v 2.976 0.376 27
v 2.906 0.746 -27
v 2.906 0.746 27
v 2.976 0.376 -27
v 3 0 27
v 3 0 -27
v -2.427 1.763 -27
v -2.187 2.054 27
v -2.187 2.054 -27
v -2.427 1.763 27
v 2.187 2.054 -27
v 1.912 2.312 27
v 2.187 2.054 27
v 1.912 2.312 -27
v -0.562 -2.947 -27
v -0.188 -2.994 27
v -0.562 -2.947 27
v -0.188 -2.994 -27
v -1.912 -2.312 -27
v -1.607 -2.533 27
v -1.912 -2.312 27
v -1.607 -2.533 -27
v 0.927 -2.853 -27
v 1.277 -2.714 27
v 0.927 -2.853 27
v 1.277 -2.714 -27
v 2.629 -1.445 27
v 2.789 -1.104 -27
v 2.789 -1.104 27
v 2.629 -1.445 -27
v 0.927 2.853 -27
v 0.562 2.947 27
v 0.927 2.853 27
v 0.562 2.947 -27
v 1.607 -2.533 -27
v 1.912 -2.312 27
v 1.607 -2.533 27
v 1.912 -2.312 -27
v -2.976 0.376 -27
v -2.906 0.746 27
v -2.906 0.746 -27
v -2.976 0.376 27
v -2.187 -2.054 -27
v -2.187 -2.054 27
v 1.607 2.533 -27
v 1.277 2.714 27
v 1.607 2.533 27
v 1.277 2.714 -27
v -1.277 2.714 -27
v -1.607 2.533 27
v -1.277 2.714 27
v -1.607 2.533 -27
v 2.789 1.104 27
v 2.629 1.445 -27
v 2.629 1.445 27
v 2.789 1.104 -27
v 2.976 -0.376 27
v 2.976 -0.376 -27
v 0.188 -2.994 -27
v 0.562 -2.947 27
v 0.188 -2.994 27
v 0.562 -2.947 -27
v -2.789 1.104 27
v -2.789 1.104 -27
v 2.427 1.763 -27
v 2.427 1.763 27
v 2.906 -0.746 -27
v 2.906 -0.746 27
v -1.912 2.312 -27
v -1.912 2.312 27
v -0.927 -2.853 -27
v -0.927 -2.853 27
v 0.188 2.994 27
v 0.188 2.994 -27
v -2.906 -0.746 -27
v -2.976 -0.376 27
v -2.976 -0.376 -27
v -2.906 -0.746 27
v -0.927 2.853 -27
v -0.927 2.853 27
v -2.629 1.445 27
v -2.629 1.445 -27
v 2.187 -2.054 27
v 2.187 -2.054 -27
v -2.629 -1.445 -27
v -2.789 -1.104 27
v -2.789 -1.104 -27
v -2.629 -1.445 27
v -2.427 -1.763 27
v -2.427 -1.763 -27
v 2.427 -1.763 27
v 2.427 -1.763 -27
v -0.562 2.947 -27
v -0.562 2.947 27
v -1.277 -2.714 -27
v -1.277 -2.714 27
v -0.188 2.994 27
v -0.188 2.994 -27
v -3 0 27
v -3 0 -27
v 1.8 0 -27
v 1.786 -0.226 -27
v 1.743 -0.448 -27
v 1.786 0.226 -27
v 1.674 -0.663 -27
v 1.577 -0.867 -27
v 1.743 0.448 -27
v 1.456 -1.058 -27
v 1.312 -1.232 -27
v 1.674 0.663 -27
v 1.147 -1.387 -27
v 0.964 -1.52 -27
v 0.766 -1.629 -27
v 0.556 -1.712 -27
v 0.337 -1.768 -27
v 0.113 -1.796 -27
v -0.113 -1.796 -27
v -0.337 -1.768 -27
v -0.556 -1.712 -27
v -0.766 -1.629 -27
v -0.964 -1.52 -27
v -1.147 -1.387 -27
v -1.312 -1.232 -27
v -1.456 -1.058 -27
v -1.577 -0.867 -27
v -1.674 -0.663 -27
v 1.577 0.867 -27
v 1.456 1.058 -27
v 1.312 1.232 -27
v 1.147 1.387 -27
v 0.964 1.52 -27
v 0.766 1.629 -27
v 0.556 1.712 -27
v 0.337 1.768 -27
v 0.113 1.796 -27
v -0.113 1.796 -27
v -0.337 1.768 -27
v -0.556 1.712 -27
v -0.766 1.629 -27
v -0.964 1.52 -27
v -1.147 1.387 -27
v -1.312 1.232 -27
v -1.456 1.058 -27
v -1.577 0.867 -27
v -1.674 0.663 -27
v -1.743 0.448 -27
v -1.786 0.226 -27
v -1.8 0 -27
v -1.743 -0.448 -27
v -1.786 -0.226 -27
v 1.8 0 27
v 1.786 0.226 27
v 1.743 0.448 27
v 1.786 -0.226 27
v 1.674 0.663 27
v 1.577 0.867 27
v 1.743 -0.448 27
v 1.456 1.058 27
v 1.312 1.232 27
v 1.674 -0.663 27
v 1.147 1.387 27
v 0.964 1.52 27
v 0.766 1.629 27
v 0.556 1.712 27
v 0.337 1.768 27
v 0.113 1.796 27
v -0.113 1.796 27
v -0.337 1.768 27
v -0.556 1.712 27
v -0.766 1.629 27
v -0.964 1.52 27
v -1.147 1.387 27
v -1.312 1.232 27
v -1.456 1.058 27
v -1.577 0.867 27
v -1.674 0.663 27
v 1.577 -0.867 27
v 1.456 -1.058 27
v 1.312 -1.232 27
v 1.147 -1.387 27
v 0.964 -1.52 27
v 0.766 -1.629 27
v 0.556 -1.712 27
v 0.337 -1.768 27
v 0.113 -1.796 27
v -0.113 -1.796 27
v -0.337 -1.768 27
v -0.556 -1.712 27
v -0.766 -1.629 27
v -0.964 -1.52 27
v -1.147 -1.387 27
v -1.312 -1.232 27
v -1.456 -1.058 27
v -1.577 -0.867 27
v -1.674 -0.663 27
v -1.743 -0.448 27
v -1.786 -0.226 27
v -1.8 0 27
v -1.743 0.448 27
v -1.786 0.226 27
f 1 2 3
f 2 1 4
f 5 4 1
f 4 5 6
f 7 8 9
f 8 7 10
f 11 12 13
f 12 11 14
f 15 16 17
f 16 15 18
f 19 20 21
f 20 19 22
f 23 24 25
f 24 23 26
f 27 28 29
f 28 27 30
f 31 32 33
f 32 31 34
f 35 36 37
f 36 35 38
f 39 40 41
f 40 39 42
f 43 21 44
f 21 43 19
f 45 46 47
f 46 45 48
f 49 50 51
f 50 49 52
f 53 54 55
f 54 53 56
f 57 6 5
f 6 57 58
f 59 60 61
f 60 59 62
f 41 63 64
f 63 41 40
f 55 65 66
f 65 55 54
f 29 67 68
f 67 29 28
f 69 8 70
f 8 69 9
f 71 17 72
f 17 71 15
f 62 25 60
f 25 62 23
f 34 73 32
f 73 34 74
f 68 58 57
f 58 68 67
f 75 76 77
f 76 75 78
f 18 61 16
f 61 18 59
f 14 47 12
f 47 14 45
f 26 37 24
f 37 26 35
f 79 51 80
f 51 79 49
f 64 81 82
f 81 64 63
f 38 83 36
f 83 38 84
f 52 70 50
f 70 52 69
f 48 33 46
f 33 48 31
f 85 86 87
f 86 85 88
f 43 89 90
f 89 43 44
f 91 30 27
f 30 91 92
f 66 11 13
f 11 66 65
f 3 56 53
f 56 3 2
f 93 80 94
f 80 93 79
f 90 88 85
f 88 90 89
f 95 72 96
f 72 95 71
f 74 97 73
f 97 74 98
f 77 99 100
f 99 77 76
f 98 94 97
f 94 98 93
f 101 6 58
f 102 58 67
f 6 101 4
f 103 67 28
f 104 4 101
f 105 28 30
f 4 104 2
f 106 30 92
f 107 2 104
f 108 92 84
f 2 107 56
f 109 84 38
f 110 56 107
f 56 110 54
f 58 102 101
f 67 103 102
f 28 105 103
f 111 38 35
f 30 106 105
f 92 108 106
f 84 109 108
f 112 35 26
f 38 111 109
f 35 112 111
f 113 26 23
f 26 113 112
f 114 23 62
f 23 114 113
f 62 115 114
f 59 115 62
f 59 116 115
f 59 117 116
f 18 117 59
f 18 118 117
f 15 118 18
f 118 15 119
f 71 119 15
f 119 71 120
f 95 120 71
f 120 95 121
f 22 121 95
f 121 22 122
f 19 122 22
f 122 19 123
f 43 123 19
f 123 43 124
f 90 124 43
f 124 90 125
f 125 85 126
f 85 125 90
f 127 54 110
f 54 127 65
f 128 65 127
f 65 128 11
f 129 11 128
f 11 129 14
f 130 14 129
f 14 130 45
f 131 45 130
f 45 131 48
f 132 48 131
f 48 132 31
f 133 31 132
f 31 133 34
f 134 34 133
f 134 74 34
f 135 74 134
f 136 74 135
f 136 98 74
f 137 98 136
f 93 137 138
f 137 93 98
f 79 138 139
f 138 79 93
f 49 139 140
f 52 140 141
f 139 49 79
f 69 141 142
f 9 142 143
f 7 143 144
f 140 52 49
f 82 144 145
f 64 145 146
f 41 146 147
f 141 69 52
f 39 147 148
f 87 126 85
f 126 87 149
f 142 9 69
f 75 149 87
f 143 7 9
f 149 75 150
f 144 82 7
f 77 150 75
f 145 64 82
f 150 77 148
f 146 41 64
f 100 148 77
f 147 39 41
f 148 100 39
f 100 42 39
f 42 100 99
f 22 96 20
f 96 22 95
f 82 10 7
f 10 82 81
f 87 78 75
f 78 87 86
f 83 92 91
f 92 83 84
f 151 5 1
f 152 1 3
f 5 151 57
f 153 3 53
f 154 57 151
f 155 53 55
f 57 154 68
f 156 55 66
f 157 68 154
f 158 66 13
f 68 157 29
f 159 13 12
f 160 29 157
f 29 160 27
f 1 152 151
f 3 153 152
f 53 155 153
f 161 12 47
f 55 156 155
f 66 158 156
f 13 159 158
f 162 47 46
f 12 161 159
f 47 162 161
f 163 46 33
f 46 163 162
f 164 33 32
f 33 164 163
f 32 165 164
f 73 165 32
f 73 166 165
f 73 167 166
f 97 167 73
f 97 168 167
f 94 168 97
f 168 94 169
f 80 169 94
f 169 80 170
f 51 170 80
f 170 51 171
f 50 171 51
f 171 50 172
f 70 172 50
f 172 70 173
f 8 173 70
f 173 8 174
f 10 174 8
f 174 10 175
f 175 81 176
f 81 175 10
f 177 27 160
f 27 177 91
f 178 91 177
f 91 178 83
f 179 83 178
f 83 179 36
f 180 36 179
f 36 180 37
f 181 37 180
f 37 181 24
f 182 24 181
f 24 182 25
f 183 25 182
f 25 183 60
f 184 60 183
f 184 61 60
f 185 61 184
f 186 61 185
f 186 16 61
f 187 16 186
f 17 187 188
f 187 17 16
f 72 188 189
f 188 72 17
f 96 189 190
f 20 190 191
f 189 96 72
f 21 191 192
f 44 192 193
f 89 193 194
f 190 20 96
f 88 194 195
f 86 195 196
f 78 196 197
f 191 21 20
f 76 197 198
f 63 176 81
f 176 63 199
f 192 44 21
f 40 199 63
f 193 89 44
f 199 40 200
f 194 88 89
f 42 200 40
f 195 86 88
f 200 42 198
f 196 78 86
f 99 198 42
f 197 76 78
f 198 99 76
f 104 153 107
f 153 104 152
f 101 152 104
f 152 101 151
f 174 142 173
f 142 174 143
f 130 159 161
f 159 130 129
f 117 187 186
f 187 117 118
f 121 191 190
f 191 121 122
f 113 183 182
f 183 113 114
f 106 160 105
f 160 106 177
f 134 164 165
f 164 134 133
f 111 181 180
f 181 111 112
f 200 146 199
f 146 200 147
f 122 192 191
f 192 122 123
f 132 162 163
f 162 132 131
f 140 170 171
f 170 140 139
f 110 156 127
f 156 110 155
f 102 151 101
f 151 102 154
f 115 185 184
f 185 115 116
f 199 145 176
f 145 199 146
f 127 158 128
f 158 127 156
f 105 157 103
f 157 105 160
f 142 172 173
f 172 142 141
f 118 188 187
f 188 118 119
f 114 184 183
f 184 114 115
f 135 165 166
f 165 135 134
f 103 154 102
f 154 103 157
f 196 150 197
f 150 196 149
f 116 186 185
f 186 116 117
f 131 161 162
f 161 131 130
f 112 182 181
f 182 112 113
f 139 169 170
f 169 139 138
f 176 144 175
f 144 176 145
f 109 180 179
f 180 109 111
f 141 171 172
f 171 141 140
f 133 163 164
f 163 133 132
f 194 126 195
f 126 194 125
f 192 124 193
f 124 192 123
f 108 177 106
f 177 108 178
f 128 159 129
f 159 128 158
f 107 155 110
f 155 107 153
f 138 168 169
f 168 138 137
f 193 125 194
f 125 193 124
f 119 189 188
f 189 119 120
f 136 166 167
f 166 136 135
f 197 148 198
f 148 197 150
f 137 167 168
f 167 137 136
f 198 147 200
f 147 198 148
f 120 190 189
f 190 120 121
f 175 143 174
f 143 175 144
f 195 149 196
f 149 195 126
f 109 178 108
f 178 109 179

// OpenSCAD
$fn = 50;


difference() {
	union() {
		translate(v = [0, 0, -27.0000000000]) {
			cylinder(h = 54, r = 3.0000000000);
		}
	}
	union() {
		#translate(v = [0, 0, -100.0000000000]) {
			cylinder(h = 200, r = 1.8000000000);
		}
	}
}
